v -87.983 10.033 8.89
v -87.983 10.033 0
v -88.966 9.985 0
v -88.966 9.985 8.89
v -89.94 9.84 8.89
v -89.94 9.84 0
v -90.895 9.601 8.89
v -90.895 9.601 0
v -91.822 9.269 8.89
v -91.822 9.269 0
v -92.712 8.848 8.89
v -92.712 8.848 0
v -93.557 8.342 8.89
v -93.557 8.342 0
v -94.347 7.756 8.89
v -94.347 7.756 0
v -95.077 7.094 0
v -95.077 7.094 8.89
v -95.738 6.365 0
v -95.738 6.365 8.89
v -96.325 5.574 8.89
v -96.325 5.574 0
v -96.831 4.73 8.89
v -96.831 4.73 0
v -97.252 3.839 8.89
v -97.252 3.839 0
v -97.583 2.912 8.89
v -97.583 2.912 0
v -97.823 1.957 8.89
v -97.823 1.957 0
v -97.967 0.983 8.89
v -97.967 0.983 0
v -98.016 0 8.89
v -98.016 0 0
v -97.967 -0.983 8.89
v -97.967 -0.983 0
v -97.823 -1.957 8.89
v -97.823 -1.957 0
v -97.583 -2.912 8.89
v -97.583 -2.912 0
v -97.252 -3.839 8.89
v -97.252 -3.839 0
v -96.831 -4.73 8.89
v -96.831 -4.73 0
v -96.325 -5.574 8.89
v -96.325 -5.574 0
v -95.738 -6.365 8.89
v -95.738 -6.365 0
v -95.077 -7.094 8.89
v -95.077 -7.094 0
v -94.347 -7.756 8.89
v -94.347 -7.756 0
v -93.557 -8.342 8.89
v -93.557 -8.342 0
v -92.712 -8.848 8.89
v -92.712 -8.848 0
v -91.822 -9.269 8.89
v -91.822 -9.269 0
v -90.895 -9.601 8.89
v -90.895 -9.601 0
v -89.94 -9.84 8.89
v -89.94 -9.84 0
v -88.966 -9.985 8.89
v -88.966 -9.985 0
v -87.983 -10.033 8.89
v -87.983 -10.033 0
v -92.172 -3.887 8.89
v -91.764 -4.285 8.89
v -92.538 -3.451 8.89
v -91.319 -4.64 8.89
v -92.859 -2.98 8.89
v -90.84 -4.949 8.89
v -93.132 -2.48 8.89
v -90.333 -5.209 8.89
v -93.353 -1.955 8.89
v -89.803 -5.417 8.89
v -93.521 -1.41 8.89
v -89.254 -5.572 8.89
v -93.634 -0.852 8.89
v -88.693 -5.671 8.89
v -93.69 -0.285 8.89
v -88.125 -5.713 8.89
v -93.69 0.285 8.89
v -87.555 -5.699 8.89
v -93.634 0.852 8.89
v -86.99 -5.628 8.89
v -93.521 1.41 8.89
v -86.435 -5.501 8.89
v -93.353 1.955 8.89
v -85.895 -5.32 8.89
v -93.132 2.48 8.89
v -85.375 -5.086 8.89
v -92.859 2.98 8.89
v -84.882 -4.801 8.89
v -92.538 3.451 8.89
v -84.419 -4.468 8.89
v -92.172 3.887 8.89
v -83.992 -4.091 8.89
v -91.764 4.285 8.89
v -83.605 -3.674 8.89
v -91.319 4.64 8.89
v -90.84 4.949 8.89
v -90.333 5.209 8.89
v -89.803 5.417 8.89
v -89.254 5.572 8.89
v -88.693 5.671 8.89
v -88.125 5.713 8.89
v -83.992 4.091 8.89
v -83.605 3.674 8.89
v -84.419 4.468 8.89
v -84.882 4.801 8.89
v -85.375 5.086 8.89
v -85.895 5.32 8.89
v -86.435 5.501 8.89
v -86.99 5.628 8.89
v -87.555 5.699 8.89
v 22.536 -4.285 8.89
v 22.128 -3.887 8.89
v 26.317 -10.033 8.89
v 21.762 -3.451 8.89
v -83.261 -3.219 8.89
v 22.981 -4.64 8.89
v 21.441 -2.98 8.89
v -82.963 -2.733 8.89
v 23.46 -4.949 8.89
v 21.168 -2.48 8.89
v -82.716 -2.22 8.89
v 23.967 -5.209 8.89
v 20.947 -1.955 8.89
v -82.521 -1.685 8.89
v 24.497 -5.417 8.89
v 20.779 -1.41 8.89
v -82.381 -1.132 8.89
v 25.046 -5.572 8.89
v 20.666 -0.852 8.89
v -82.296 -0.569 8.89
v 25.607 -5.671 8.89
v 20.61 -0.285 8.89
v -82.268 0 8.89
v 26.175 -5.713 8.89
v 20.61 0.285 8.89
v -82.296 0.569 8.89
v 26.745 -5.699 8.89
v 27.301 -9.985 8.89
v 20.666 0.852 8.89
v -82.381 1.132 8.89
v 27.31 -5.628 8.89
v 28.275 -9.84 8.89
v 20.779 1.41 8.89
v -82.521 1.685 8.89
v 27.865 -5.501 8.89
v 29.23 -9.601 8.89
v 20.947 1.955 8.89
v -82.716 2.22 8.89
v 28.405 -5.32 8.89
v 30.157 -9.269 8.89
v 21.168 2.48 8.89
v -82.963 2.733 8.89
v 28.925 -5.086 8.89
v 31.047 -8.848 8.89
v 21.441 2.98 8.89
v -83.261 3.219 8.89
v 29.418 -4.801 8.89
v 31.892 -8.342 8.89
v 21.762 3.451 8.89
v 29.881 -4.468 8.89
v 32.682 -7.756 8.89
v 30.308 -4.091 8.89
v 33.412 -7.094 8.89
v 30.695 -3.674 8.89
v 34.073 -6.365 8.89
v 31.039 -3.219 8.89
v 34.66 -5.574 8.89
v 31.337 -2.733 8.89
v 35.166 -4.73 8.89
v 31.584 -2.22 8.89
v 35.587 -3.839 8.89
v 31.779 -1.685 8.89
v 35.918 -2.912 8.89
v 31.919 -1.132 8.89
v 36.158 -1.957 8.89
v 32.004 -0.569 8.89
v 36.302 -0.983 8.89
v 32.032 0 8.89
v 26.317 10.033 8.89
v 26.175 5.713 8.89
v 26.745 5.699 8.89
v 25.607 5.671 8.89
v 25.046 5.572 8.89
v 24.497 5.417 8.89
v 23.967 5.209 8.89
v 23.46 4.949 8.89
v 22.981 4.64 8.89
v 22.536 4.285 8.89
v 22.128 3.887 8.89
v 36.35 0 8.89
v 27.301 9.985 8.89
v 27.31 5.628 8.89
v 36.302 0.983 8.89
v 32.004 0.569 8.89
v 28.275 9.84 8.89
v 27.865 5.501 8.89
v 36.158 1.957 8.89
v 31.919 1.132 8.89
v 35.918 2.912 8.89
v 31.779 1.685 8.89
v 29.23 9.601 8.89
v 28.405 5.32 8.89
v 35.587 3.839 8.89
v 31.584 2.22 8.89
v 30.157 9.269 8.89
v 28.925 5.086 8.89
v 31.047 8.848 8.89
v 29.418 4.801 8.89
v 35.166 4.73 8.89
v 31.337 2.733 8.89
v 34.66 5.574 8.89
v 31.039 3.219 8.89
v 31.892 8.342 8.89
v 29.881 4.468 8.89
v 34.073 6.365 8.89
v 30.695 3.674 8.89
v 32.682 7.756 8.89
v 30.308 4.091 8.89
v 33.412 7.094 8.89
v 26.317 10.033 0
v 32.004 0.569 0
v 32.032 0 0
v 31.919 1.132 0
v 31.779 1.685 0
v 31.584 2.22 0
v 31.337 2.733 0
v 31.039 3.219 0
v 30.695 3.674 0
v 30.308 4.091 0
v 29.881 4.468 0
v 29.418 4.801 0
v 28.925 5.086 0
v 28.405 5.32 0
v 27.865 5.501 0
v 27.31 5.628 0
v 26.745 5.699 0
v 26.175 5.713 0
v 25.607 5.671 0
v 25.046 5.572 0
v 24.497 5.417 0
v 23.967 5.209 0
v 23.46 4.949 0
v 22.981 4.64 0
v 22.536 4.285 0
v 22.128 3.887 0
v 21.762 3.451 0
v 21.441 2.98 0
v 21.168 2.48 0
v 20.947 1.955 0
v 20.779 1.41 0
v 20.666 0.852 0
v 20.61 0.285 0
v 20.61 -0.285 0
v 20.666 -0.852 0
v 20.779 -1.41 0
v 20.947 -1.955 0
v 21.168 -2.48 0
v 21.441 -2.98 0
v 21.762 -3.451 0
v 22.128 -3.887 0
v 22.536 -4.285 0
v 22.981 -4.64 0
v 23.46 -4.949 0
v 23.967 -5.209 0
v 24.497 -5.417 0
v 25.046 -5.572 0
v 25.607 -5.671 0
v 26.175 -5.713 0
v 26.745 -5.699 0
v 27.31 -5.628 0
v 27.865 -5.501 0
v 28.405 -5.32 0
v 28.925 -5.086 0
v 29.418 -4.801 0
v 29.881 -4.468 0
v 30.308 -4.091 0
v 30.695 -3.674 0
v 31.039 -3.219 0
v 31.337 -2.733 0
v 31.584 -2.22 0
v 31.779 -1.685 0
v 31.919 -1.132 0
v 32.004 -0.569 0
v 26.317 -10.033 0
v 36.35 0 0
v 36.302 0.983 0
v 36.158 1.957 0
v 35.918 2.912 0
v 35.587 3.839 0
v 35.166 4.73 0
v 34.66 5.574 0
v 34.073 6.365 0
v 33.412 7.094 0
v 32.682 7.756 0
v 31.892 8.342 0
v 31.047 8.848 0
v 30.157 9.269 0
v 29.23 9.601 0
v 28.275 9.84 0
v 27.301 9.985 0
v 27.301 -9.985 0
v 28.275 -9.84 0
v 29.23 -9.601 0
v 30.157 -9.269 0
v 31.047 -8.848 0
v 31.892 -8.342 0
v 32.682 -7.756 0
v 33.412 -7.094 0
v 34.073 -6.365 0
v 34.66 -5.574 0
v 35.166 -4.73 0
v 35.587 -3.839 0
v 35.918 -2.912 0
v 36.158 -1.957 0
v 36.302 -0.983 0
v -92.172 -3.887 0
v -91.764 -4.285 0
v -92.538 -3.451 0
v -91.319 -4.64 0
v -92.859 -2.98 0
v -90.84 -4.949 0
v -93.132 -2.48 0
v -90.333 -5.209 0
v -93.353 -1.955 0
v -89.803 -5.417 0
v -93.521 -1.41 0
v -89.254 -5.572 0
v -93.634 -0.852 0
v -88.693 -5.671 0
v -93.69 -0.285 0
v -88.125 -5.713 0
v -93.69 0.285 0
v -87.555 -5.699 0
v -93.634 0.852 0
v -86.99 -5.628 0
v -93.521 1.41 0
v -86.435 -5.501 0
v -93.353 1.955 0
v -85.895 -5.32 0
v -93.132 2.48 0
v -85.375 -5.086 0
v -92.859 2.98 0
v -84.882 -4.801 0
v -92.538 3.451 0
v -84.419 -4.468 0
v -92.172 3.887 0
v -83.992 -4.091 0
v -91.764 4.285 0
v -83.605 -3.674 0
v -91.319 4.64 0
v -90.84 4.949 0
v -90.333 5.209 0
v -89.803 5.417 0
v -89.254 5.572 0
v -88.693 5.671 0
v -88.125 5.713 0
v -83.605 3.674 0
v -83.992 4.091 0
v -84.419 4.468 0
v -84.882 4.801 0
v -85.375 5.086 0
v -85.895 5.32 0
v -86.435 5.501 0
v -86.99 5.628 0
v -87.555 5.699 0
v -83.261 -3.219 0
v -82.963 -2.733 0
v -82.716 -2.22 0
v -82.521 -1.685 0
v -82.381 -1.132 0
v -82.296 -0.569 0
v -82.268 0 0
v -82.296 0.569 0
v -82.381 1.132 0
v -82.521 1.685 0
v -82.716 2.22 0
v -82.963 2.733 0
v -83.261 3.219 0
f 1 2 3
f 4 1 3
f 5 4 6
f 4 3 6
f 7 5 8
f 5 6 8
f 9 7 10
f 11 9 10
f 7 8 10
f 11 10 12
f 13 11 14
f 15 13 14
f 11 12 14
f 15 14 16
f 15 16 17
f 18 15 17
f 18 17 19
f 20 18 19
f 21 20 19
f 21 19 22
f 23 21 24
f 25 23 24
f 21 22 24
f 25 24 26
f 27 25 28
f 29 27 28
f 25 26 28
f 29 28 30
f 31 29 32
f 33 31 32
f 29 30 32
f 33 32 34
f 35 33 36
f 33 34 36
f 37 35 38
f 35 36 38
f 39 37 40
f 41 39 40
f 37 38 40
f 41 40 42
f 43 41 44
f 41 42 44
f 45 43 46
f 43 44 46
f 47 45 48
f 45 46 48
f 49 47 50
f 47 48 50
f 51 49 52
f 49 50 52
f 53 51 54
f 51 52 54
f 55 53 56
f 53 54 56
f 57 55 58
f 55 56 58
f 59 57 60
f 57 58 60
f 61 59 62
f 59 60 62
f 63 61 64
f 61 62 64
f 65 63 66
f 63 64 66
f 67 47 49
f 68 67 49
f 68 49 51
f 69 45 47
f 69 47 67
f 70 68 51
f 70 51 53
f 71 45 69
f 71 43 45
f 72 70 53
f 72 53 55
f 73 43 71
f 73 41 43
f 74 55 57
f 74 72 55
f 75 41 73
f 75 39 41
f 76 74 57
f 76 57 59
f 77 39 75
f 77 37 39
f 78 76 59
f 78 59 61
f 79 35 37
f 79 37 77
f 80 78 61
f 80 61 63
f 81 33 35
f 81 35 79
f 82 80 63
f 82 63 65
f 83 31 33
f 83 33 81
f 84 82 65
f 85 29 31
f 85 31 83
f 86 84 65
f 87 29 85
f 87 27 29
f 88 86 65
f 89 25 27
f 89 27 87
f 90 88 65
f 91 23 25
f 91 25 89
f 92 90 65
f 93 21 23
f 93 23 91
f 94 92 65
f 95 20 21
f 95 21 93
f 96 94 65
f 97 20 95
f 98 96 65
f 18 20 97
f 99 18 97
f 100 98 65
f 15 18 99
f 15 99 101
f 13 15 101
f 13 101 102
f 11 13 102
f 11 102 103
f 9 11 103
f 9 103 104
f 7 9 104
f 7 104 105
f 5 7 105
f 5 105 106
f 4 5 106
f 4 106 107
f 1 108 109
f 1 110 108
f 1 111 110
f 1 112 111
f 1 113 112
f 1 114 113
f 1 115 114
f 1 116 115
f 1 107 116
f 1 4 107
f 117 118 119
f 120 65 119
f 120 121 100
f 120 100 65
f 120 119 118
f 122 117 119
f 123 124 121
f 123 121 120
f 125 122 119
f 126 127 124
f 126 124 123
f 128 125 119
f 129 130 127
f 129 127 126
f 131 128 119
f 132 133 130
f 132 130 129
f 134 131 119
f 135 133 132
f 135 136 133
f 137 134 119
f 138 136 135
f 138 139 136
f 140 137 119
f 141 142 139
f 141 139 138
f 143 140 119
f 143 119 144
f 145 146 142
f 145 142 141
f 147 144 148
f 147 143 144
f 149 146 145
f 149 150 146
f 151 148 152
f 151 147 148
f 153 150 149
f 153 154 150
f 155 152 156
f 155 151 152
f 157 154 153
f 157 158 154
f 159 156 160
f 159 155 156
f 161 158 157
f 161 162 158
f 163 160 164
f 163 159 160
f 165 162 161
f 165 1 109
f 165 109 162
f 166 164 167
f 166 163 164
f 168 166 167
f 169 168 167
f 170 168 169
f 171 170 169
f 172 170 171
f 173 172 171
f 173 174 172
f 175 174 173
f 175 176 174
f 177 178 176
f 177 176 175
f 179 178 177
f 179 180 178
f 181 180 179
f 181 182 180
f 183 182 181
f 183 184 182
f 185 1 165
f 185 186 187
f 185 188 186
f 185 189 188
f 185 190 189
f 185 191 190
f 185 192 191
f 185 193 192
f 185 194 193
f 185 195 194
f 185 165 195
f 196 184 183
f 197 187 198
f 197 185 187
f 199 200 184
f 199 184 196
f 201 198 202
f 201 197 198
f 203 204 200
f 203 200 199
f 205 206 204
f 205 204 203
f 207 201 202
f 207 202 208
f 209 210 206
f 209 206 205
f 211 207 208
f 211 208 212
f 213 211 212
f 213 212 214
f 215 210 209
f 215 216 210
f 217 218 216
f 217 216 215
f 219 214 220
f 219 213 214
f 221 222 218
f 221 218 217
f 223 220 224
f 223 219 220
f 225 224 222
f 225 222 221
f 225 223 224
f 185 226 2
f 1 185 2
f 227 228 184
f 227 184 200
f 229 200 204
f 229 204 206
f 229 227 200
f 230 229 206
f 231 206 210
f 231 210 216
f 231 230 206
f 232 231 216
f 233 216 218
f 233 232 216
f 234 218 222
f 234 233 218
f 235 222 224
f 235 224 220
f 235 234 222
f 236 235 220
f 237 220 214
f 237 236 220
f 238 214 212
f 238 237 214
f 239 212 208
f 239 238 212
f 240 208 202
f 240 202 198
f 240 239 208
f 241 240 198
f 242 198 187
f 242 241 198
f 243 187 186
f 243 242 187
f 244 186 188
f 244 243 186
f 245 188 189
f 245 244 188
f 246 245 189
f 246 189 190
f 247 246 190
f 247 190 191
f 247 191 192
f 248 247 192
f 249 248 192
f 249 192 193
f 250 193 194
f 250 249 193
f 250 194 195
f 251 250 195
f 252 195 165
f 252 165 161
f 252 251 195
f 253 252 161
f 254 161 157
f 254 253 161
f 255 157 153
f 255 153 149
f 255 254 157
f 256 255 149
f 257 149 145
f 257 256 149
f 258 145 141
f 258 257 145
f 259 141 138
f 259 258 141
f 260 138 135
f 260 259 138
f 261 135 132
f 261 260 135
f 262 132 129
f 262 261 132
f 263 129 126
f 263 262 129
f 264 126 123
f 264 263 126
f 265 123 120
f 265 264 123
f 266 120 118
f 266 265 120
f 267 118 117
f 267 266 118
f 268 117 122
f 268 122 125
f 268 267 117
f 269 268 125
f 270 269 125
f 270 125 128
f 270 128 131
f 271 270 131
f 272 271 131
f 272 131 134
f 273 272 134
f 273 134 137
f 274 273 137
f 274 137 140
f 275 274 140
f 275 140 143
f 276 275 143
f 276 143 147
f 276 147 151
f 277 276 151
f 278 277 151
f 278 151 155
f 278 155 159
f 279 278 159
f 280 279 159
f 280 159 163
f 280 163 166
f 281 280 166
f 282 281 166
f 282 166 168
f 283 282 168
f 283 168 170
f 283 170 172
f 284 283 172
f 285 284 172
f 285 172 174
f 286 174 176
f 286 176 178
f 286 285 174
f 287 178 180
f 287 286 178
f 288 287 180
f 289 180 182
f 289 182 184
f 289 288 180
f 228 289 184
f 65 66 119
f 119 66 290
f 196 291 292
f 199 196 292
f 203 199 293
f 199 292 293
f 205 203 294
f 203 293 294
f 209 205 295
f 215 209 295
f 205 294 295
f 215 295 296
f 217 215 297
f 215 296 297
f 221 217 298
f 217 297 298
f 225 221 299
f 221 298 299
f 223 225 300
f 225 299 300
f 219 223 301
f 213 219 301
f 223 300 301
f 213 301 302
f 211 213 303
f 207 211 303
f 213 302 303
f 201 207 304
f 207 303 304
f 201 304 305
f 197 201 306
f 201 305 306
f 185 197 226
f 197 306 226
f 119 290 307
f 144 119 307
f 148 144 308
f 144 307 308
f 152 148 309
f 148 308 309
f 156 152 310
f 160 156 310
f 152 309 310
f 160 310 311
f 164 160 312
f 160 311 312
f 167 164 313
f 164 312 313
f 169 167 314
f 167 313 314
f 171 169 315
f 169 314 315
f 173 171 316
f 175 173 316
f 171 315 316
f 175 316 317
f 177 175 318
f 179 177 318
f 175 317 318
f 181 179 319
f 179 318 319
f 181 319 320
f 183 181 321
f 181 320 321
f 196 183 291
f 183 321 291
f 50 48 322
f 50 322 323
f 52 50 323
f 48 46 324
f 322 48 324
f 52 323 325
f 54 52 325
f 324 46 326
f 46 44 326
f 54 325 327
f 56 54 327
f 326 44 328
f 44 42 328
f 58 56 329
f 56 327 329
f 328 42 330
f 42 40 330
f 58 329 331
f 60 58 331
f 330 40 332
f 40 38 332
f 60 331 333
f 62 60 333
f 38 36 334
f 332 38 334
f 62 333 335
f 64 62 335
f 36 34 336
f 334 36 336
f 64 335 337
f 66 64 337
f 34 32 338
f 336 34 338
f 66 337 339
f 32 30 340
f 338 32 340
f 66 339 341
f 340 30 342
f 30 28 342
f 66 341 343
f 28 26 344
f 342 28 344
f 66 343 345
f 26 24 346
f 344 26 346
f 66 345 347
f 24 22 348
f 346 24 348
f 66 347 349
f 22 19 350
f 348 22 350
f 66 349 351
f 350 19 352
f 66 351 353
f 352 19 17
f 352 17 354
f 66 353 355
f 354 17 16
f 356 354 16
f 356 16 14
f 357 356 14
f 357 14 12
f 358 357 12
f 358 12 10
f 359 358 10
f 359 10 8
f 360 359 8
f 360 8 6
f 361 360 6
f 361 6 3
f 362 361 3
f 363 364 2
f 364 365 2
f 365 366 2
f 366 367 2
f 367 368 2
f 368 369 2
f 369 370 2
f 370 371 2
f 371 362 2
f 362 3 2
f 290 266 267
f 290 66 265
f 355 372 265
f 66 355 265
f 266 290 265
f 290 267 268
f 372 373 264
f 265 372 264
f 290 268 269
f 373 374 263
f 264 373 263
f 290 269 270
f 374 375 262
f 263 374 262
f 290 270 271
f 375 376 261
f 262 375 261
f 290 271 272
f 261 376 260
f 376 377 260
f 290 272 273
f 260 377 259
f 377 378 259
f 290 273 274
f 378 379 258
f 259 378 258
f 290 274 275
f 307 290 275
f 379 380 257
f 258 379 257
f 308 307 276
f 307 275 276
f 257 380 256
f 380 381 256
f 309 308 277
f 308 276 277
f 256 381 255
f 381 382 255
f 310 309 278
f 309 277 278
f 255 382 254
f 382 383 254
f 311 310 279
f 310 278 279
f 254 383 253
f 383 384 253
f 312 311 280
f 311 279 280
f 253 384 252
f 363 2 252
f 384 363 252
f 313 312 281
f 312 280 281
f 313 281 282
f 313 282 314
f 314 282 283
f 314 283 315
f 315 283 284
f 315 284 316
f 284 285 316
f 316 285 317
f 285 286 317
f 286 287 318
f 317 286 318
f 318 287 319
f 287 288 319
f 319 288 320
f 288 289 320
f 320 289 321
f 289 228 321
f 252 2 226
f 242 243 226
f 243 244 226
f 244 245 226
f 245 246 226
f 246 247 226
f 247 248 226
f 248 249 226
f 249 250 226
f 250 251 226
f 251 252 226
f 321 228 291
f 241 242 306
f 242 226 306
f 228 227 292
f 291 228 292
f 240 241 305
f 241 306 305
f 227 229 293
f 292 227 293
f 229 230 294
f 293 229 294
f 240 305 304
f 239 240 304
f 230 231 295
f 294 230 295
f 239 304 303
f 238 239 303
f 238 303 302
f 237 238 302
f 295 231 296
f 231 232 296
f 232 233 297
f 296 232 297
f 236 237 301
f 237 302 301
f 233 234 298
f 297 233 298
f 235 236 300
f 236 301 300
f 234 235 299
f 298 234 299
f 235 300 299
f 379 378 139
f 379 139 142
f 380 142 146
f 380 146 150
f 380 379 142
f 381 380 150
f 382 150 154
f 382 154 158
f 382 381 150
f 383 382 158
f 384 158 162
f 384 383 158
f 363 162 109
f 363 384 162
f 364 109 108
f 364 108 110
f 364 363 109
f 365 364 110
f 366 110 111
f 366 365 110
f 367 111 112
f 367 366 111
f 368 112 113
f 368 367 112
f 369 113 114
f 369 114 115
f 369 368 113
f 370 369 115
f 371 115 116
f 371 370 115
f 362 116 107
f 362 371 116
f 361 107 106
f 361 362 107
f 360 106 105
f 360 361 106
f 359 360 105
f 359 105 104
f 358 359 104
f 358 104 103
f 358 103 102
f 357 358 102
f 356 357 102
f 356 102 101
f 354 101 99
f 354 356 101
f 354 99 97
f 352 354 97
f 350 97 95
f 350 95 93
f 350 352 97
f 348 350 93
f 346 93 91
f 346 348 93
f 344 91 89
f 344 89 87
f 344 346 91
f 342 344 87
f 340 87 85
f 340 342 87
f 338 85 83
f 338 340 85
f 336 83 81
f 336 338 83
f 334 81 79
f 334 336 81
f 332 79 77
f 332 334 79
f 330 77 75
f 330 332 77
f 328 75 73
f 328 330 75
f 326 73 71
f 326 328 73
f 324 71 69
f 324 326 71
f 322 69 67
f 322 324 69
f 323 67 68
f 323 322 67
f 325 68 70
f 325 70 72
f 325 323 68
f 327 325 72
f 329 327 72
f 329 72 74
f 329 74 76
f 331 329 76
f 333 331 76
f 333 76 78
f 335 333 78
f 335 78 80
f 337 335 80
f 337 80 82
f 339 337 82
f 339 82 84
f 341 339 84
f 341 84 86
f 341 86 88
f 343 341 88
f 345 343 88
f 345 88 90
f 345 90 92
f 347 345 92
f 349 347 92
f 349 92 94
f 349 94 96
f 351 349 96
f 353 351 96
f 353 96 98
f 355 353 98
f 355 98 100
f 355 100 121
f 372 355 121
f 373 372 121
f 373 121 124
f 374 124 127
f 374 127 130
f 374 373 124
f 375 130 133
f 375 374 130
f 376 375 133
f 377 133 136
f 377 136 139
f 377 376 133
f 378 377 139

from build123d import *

# Parameters (mm, degrees)
F0_R     = 5.715
F1_DEPTH = 8.89


# Not quite as in the source:
# - the program builds the solid bodies; features that only make, move or delete a surface that nothing else refers to are left out


with BuildPart() as f1:
    # F0 (on Top) → F1 (new body)
    with BuildSketch(Plane.XY):
        with BuildLine():
            ThreePointArc((-87.9825091655, 10.033), (-80.8881068298, 7.0944023356), (-77.9495091655, 0))
            ThreePointArc((-77.9495091655, 0), (-80.8881068298, -7.0944023356), (-87.9825091655, -10.033))
            Line((-87.9825091655, -10.033), (26.3174908345, -10.033))
            ThreePointArc((26.3174908345, -10.033), (16.2844908345, 0), (26.3174908345, 10.033))
            Line((26.3174908345, 10.033), (-87.9825091655, 10.033))
        make_face()
        with BuildLine():
            ThreePointArc((-87.9825091655, -10.033), (-80.8881068298, -7.0944023356), (-77.9495091655, 0))
            ThreePointArc((-77.9495091655, 0), (-80.8881068298, 7.0944023356), (-87.9825091655, 10.033))
            ThreePointArc((-87.9825091655, 10.033), (-98.0155091655, 0), (-87.9825091655, -10.033))
        make_face()
        with Locations((-87.9825091655, 0)):
            Circle(F0_R, mode=Mode.SUBTRACT)
        with BuildLine():
            ThreePointArc((36.3504908345, 0), (33.4118931702, 7.0944023356), (26.3174908345, 10.033))
            ThreePointArc((26.3174908345, 10.033), (16.2844908345, 0), (26.3174908345, -10.033))
            ThreePointArc((26.3174908345, -10.033), (33.4118931702, -7.0944023356), (36.3504908345, 0))
        make_face()
        with Locations((26.3174908345, 0)):
            Circle(F0_R, mode=Mode.SUBTRACT)
    extrude(amount=F1_DEPTH)


solid = f1.part
